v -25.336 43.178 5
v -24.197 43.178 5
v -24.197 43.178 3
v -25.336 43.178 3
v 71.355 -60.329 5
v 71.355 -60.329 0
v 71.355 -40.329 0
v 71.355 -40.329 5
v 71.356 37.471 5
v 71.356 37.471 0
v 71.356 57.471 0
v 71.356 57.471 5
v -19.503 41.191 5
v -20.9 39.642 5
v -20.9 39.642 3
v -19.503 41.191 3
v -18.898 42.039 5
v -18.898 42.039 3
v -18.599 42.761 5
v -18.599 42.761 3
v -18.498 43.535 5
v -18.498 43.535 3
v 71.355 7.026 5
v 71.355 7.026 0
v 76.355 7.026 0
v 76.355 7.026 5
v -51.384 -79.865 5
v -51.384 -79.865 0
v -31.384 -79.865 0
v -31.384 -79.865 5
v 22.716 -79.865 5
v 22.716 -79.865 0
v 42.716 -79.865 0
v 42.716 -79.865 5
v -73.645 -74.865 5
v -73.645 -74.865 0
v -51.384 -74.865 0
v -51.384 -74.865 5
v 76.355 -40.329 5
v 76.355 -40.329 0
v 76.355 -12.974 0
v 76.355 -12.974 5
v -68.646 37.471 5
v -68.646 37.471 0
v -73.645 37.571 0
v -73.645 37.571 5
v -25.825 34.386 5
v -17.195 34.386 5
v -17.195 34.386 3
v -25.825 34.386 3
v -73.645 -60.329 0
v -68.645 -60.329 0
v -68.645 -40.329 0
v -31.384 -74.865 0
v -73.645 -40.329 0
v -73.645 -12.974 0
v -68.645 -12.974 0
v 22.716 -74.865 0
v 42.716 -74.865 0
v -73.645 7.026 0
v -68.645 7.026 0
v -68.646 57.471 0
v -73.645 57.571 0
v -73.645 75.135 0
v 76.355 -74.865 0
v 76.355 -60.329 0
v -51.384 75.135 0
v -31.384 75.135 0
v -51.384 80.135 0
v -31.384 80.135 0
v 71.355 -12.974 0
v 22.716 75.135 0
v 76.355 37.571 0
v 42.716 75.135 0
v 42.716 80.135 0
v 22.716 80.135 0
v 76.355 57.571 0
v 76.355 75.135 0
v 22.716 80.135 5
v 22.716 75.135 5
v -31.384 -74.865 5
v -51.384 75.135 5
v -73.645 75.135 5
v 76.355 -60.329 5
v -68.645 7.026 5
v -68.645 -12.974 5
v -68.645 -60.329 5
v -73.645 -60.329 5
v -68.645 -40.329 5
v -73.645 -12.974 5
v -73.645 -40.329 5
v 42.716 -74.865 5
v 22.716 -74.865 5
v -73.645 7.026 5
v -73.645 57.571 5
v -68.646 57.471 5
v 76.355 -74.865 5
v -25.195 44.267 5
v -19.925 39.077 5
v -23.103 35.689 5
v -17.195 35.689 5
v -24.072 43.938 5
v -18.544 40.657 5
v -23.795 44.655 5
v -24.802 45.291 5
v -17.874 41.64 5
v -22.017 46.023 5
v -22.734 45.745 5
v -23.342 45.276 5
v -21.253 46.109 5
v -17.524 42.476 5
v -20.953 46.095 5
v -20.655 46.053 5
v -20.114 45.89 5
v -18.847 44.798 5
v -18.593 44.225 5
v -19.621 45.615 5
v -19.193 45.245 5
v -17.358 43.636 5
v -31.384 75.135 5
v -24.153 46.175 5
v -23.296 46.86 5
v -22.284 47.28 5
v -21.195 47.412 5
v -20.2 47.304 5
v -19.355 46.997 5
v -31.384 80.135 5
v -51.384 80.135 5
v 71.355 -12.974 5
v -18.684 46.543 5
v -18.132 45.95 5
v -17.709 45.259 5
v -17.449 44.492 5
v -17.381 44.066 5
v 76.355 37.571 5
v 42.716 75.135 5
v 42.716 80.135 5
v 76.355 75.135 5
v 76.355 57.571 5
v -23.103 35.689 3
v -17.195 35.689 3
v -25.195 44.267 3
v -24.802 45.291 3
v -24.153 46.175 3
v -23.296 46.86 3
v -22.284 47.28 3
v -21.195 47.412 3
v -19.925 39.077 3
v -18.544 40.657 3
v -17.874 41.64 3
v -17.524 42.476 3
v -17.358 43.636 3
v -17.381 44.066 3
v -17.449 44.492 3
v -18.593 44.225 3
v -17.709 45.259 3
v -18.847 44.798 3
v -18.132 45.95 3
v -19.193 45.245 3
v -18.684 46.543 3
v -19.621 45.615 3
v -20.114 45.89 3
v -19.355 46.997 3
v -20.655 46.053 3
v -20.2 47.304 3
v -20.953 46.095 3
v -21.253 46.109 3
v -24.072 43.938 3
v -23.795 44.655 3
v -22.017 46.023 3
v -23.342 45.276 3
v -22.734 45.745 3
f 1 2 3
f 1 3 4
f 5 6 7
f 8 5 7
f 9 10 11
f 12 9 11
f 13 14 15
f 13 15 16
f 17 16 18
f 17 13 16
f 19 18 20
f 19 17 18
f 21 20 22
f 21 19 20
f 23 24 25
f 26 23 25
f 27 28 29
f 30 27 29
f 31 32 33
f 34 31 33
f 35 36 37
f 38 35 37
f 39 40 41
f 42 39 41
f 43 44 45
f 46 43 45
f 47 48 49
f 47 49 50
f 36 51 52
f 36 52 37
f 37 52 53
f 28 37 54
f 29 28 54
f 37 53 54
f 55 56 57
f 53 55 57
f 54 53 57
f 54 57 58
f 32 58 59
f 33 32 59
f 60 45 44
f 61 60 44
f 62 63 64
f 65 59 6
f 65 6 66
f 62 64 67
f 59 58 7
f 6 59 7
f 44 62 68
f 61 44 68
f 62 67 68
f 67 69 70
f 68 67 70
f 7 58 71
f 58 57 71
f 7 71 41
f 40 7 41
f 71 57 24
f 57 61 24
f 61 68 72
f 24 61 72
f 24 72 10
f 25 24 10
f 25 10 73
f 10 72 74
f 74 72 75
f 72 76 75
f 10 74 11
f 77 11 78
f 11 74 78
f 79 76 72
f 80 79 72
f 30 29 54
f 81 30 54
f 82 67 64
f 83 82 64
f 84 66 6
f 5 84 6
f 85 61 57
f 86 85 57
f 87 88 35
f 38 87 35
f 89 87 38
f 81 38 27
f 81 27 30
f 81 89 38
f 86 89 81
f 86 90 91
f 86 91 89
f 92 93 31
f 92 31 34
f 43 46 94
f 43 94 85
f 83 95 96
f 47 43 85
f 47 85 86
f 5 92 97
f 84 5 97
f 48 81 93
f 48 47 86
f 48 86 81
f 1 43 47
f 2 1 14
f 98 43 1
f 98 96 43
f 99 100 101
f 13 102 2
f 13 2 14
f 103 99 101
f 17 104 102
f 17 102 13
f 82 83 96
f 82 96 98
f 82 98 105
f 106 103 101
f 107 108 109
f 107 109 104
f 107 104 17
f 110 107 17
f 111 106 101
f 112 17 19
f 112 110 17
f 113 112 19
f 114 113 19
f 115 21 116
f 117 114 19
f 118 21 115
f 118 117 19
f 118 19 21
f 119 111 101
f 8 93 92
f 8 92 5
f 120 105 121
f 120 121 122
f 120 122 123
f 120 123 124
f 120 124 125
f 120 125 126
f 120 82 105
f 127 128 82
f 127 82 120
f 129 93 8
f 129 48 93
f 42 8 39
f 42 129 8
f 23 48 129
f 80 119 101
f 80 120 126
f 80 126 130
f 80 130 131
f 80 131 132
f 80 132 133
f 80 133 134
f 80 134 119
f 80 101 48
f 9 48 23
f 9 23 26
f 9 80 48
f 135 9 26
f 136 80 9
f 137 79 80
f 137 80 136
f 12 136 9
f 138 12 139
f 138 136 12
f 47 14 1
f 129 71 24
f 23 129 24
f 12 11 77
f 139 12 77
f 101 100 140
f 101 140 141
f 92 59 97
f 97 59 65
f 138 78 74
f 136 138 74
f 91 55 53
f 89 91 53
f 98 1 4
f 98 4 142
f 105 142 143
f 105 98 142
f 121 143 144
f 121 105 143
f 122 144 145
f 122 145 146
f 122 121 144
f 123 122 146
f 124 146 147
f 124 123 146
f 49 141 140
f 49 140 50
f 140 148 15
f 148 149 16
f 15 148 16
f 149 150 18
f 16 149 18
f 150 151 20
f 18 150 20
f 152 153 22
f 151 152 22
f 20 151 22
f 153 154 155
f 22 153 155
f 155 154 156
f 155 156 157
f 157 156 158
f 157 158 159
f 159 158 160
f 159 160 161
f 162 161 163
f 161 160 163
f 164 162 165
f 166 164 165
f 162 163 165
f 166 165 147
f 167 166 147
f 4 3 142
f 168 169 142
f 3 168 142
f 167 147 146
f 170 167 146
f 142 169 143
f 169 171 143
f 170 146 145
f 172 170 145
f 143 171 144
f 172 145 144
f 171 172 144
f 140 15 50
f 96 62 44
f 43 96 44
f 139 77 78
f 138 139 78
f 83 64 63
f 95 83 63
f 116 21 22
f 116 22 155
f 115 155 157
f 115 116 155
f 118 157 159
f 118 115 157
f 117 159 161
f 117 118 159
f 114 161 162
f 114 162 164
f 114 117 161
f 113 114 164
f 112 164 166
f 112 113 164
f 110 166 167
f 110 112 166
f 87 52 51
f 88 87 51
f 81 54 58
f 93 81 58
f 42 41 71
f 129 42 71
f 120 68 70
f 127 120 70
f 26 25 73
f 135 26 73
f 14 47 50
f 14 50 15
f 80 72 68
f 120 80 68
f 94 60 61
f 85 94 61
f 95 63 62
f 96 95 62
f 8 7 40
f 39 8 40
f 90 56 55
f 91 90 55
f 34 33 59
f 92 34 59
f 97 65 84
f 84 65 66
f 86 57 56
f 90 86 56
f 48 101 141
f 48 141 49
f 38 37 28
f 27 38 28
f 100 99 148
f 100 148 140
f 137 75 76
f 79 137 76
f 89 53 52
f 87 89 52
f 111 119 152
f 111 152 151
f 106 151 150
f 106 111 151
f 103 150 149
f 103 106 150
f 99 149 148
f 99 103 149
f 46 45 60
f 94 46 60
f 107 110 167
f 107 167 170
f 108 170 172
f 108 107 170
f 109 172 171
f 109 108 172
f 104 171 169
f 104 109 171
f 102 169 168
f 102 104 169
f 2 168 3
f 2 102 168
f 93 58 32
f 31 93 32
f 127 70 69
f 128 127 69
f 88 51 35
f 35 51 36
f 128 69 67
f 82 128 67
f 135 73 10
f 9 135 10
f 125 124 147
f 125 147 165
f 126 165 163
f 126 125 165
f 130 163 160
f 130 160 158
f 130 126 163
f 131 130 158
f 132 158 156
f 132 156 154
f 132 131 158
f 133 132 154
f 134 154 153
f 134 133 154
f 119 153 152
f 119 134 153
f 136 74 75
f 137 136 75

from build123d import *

# Parameters (mm, degrees)
BOSS_EXTRUDE1_DEPTH = 5
CUT_EXTRUDE1_DEPTH  = 2


with BuildPart() as part:
    # Sketch1 → Boss-Extrude1 (new body)
    with BuildSketch(Plane.XY):
        Polygon((-73.645107518, -74.864510752), (-51.383851785, -74.864510752), (-51.383851785, -79.864510752), (-31.383851785, -79.864510752), (-31.383851785, -74.864510752), (22.715789763, -74.864510752), (22.715789763, -79.864510752), (42.715789763, -79.864510752), (42.715789763, -74.864510752), (76.354892482, -74.864510752), (76.354892482, -60.328664174), (71.354892482, -60.328664174), (71.354892482, -40.328664174), (76.354892482, -40.328664174), (76.354892482, -12.973595237), (71.354892482, -12.973595237), (71.354892482, 7.026404763), (76.354892482, 7.026404763), (76.354892482, 37.571193369), (71.355899646, 37.470840861), (71.355899646, 57.470840861), (76.354892482, 57.571193369), (76.354892482, 75.135489248), (42.715789763, 75.135489248), (42.715789763, 80.135489248), (22.715789763, 80.135489248), (22.715789763, 75.135489248), (-31.383851785, 75.135489248), (-31.383851785, 80.135489248), (-51.383851785, 80.135489248), (-51.383851785, 75.135489248), (-73.645107518, 75.135489248), (-73.645107518, 57.571193369), (-68.646114682, 57.470840861), (-68.646114682, 37.470840861), (-73.645107518, 37.571193369), (-73.645107518, 7.026404763), (-68.645107518, 7.026404763), (-68.645107518, -12.973595237), (-73.645107518, -12.973595237), (-73.645107518, -40.328664174), (-68.645107518, -40.328664174), (-68.645107518, -60.328664174), (-73.645107518, -60.328664174), align=None)
    extrude(amount=BOSS_EXTRUDE1_DEPTH)

    # Sketch2 → Cut-Extrude1 (cut)
    with BuildSketch(Plane.XY.offset(5)):
        with BuildLine():
            Line((-24.19666878, 43.178385546), (-25.33641237, 43.178385546))
            add(Edge.make_bspline(
                [(-25.33641237, 43.178385546), (-25.328984129, 43.329591339), (-25.314395262, 43.626555492), (-25.246075469, 44.059530809), (-25.148318572, 44.473386793), (-25.01010101, 44.864800481), (-24.838446802, 45.237232725), (-24.632597846, 45.58920421), (-24.38878016, 45.919372238), (-24.112258582, 46.22467604), (-23.811926663, 46.504756655), (-23.487873683, 46.746619964), (-23.147350298, 46.950972657), (-22.791389622, 47.121810306), (-22.415975577, 47.250043461), (-22.024514921, 47.345190554), (-21.615287769, 47.402436151), (-21.33646826, 47.40858943), (-21.194665575, 47.41171888)],
                knots=[0, 0, 0, 0, 0.000453872, 0.000891393, 0.001312835, 0.001728009, 0.002134376, 0.002541468, 0.002949043, 0.00336336, 0.003775633, 0.004179123, 0.004573978, 0.004965443, 0.005361289, 0.005761752, 0.006172633, 0.006597866, 0.006597866, 0.006597866, 0.006597866], degree=3))
            add(Edge.make_bspline(
                [(-21.194665575, 47.41171888), (-21.055407992, 47.408458766), (-20.781771816, 47.40205276), (-20.382403935, 47.347039882), (-20.002212038, 47.260877307), (-19.641939285, 47.139989939), (-19.304460136, 46.977486445), (-18.987239375, 46.782278234), (-18.686500433, 46.556509131), (-18.415784389, 46.290702437), (-18.16719793, 46.006939499), (-17.952741176, 45.703997677), (-17.769087697, 45.391108555), (-17.616006687, 45.065886223), (-17.503317269, 44.725268492), (-17.417762057, 44.374214356), (-17.369402584, 44.009090042), (-17.361980619, 43.76196054), (-17.358207242, 43.636318239)],
                knots=[0, 0, 0, 0, 0.000417607, 0.000820584, 0.001206914, 0.001585844, 0.001957948, 0.002327951, 0.002701938, 0.003083379, 0.003463911, 0.003832406, 0.004194997, 0.004551257, 0.004908462, 0.005269442, 0.005633919, 0.006010863, 0.006010863, 0.006010863, 0.006010863], degree=3))
            add(Edge.make_bspline(
                [(-17.358207242, 43.636318239), (-17.364327354, 43.459426074), (-17.376460178, 43.108745951), (-17.481165156, 42.592747282), (-17.642934479, 42.092348925), (-17.839142328, 41.689653506), (-18.037336959, 41.366794494), (-18.212160789, 41.09858631), (-18.421356469, 40.812559028), (-18.66300994, 40.505831861), (-18.933475694, 40.177466576), (-19.234700346, 39.827328424), (-19.568984994, 39.459136174), (-19.803601825, 39.207655081), (-19.925174389, 39.07734388)],
                knots=[0, 0, 0, 0, 0.000530199, 0.001051094, 0.001573224, 0.002104594, 0.002389938, 0.002709581, 0.003064778, 0.003452579, 0.003880929, 0.004340927, 0.00483807, 0.005372718, 0.005372718, 0.005372718, 0.005372718], degree=3))
            Line((-19.925174389, 39.07734388), (-23.10271846, 35.688641956))
            Line((-23.10271846, 35.688641956), (-17.195386729, 35.688641956))
            Line((-17.195386729, 35.688641956), (-17.195386729, 34.386077854))
            Line((-17.195386729, 34.386077854), (-25.824873909, 34.386077854))
            Line((-25.824873909, 34.386077854), (-20.899553396, 39.642127533))
            add(Edge.make_bspline(
                [(-20.899553396, 39.642127533), (-20.779636778, 39.767307103), (-20.549301497, 40.007751437), (-20.223519004, 40.358790178), (-19.930914675, 40.684452798), (-19.669594421, 40.984123988), (-19.44522713, 41.262187105), (-19.246119317, 41.509636458), (-19.08658703, 41.737345463), (-18.913448308, 42.001289977), (-18.745757576, 42.323551813), (-18.601658455, 42.717374057), (-18.513793148, 43.122784374), (-18.503252745, 43.396748909), (-18.497950832, 43.534555418)],
                knots=[0, 0, 0, 0, 0.000520043, 0.000998896, 0.001436661, 0.001833471, 0.002191472, 0.002508543, 0.002785952, 0.003025175, 0.003455296, 0.003872183, 0.004280329, 0.004693418, 0.004693418, 0.004693418, 0.004693418], degree=3))
            add(Edge.make_bspline(
                [(-18.497950832, 43.534555418), (-18.500257668, 43.621210778), (-18.504803999, 43.791991852), (-18.544927645, 44.042384178), (-18.60556291, 44.283919359), (-18.692449989, 44.517340349), (-18.807137303, 44.740300286), (-18.94674071, 44.953070571), (-19.107813226, 45.158770531), (-19.294144974, 45.35164107), (-19.498838203, 45.528284301), (-19.715080195, 45.684763125), (-19.943862002, 45.815533613), (-20.184219016, 45.922734303), (-20.435481148, 46.006827829), (-20.698134366, 46.065097531), (-20.97145294, 46.101682544), (-21.158083053, 46.10663254), (-21.253179197, 46.109154777)],
                knots=[0, 0, 0, 0, 0.000259807, 0.000512029, 0.000758843, 0.001005985, 0.001257437, 0.001509351, 0.001768409, 0.002040101, 0.00231246, 0.002578628, 0.002839591, 0.003101519, 0.003367006, 0.003633016, 0.003907552, 0.004192772, 0.004192772, 0.004192772, 0.004192772], degree=3))
            add(Edge.make_bspline(
                [(-21.253179197, 46.109154777), (-21.352496219, 46.106560231), (-21.547538451, 46.101464972), (-21.833901799, 46.065822734), (-22.10708162, 46.004333542), (-22.367765097, 45.920235323), (-22.616393308, 45.813342875), (-22.851757125, 45.680204258), (-23.07332818, 45.521332726), (-23.281522993, 45.341208422), (-23.473343717, 45.140665983), (-23.641879524, 44.917109831), (-23.789141518, 44.674621781), (-23.917626451, 44.413856126), (-24.021968527, 44.132446696), (-24.101699673, 43.831392453), (-24.164789088, 43.512000583), (-24.18586572, 43.291437561), (-24.19666878, 43.178385546)],
                knots=[0, 0, 0, 0, 0.000297928, 0.000585081, 0.00086406, 0.001136798, 0.001405713, 0.001674567, 0.001946354, 0.002222301, 0.00249943, 0.002777246, 0.003060416, 0.003349412, 0.003648067, 0.00395911, 0.004282927, 0.004623434, 0.004623434, 0.004623434, 0.004623434], degree=3))
        make_face()
    extrude(amount=-CUT_EXTRUDE1_DEPTH, mode=Mode.SUBTRACT)


solid = part.part
